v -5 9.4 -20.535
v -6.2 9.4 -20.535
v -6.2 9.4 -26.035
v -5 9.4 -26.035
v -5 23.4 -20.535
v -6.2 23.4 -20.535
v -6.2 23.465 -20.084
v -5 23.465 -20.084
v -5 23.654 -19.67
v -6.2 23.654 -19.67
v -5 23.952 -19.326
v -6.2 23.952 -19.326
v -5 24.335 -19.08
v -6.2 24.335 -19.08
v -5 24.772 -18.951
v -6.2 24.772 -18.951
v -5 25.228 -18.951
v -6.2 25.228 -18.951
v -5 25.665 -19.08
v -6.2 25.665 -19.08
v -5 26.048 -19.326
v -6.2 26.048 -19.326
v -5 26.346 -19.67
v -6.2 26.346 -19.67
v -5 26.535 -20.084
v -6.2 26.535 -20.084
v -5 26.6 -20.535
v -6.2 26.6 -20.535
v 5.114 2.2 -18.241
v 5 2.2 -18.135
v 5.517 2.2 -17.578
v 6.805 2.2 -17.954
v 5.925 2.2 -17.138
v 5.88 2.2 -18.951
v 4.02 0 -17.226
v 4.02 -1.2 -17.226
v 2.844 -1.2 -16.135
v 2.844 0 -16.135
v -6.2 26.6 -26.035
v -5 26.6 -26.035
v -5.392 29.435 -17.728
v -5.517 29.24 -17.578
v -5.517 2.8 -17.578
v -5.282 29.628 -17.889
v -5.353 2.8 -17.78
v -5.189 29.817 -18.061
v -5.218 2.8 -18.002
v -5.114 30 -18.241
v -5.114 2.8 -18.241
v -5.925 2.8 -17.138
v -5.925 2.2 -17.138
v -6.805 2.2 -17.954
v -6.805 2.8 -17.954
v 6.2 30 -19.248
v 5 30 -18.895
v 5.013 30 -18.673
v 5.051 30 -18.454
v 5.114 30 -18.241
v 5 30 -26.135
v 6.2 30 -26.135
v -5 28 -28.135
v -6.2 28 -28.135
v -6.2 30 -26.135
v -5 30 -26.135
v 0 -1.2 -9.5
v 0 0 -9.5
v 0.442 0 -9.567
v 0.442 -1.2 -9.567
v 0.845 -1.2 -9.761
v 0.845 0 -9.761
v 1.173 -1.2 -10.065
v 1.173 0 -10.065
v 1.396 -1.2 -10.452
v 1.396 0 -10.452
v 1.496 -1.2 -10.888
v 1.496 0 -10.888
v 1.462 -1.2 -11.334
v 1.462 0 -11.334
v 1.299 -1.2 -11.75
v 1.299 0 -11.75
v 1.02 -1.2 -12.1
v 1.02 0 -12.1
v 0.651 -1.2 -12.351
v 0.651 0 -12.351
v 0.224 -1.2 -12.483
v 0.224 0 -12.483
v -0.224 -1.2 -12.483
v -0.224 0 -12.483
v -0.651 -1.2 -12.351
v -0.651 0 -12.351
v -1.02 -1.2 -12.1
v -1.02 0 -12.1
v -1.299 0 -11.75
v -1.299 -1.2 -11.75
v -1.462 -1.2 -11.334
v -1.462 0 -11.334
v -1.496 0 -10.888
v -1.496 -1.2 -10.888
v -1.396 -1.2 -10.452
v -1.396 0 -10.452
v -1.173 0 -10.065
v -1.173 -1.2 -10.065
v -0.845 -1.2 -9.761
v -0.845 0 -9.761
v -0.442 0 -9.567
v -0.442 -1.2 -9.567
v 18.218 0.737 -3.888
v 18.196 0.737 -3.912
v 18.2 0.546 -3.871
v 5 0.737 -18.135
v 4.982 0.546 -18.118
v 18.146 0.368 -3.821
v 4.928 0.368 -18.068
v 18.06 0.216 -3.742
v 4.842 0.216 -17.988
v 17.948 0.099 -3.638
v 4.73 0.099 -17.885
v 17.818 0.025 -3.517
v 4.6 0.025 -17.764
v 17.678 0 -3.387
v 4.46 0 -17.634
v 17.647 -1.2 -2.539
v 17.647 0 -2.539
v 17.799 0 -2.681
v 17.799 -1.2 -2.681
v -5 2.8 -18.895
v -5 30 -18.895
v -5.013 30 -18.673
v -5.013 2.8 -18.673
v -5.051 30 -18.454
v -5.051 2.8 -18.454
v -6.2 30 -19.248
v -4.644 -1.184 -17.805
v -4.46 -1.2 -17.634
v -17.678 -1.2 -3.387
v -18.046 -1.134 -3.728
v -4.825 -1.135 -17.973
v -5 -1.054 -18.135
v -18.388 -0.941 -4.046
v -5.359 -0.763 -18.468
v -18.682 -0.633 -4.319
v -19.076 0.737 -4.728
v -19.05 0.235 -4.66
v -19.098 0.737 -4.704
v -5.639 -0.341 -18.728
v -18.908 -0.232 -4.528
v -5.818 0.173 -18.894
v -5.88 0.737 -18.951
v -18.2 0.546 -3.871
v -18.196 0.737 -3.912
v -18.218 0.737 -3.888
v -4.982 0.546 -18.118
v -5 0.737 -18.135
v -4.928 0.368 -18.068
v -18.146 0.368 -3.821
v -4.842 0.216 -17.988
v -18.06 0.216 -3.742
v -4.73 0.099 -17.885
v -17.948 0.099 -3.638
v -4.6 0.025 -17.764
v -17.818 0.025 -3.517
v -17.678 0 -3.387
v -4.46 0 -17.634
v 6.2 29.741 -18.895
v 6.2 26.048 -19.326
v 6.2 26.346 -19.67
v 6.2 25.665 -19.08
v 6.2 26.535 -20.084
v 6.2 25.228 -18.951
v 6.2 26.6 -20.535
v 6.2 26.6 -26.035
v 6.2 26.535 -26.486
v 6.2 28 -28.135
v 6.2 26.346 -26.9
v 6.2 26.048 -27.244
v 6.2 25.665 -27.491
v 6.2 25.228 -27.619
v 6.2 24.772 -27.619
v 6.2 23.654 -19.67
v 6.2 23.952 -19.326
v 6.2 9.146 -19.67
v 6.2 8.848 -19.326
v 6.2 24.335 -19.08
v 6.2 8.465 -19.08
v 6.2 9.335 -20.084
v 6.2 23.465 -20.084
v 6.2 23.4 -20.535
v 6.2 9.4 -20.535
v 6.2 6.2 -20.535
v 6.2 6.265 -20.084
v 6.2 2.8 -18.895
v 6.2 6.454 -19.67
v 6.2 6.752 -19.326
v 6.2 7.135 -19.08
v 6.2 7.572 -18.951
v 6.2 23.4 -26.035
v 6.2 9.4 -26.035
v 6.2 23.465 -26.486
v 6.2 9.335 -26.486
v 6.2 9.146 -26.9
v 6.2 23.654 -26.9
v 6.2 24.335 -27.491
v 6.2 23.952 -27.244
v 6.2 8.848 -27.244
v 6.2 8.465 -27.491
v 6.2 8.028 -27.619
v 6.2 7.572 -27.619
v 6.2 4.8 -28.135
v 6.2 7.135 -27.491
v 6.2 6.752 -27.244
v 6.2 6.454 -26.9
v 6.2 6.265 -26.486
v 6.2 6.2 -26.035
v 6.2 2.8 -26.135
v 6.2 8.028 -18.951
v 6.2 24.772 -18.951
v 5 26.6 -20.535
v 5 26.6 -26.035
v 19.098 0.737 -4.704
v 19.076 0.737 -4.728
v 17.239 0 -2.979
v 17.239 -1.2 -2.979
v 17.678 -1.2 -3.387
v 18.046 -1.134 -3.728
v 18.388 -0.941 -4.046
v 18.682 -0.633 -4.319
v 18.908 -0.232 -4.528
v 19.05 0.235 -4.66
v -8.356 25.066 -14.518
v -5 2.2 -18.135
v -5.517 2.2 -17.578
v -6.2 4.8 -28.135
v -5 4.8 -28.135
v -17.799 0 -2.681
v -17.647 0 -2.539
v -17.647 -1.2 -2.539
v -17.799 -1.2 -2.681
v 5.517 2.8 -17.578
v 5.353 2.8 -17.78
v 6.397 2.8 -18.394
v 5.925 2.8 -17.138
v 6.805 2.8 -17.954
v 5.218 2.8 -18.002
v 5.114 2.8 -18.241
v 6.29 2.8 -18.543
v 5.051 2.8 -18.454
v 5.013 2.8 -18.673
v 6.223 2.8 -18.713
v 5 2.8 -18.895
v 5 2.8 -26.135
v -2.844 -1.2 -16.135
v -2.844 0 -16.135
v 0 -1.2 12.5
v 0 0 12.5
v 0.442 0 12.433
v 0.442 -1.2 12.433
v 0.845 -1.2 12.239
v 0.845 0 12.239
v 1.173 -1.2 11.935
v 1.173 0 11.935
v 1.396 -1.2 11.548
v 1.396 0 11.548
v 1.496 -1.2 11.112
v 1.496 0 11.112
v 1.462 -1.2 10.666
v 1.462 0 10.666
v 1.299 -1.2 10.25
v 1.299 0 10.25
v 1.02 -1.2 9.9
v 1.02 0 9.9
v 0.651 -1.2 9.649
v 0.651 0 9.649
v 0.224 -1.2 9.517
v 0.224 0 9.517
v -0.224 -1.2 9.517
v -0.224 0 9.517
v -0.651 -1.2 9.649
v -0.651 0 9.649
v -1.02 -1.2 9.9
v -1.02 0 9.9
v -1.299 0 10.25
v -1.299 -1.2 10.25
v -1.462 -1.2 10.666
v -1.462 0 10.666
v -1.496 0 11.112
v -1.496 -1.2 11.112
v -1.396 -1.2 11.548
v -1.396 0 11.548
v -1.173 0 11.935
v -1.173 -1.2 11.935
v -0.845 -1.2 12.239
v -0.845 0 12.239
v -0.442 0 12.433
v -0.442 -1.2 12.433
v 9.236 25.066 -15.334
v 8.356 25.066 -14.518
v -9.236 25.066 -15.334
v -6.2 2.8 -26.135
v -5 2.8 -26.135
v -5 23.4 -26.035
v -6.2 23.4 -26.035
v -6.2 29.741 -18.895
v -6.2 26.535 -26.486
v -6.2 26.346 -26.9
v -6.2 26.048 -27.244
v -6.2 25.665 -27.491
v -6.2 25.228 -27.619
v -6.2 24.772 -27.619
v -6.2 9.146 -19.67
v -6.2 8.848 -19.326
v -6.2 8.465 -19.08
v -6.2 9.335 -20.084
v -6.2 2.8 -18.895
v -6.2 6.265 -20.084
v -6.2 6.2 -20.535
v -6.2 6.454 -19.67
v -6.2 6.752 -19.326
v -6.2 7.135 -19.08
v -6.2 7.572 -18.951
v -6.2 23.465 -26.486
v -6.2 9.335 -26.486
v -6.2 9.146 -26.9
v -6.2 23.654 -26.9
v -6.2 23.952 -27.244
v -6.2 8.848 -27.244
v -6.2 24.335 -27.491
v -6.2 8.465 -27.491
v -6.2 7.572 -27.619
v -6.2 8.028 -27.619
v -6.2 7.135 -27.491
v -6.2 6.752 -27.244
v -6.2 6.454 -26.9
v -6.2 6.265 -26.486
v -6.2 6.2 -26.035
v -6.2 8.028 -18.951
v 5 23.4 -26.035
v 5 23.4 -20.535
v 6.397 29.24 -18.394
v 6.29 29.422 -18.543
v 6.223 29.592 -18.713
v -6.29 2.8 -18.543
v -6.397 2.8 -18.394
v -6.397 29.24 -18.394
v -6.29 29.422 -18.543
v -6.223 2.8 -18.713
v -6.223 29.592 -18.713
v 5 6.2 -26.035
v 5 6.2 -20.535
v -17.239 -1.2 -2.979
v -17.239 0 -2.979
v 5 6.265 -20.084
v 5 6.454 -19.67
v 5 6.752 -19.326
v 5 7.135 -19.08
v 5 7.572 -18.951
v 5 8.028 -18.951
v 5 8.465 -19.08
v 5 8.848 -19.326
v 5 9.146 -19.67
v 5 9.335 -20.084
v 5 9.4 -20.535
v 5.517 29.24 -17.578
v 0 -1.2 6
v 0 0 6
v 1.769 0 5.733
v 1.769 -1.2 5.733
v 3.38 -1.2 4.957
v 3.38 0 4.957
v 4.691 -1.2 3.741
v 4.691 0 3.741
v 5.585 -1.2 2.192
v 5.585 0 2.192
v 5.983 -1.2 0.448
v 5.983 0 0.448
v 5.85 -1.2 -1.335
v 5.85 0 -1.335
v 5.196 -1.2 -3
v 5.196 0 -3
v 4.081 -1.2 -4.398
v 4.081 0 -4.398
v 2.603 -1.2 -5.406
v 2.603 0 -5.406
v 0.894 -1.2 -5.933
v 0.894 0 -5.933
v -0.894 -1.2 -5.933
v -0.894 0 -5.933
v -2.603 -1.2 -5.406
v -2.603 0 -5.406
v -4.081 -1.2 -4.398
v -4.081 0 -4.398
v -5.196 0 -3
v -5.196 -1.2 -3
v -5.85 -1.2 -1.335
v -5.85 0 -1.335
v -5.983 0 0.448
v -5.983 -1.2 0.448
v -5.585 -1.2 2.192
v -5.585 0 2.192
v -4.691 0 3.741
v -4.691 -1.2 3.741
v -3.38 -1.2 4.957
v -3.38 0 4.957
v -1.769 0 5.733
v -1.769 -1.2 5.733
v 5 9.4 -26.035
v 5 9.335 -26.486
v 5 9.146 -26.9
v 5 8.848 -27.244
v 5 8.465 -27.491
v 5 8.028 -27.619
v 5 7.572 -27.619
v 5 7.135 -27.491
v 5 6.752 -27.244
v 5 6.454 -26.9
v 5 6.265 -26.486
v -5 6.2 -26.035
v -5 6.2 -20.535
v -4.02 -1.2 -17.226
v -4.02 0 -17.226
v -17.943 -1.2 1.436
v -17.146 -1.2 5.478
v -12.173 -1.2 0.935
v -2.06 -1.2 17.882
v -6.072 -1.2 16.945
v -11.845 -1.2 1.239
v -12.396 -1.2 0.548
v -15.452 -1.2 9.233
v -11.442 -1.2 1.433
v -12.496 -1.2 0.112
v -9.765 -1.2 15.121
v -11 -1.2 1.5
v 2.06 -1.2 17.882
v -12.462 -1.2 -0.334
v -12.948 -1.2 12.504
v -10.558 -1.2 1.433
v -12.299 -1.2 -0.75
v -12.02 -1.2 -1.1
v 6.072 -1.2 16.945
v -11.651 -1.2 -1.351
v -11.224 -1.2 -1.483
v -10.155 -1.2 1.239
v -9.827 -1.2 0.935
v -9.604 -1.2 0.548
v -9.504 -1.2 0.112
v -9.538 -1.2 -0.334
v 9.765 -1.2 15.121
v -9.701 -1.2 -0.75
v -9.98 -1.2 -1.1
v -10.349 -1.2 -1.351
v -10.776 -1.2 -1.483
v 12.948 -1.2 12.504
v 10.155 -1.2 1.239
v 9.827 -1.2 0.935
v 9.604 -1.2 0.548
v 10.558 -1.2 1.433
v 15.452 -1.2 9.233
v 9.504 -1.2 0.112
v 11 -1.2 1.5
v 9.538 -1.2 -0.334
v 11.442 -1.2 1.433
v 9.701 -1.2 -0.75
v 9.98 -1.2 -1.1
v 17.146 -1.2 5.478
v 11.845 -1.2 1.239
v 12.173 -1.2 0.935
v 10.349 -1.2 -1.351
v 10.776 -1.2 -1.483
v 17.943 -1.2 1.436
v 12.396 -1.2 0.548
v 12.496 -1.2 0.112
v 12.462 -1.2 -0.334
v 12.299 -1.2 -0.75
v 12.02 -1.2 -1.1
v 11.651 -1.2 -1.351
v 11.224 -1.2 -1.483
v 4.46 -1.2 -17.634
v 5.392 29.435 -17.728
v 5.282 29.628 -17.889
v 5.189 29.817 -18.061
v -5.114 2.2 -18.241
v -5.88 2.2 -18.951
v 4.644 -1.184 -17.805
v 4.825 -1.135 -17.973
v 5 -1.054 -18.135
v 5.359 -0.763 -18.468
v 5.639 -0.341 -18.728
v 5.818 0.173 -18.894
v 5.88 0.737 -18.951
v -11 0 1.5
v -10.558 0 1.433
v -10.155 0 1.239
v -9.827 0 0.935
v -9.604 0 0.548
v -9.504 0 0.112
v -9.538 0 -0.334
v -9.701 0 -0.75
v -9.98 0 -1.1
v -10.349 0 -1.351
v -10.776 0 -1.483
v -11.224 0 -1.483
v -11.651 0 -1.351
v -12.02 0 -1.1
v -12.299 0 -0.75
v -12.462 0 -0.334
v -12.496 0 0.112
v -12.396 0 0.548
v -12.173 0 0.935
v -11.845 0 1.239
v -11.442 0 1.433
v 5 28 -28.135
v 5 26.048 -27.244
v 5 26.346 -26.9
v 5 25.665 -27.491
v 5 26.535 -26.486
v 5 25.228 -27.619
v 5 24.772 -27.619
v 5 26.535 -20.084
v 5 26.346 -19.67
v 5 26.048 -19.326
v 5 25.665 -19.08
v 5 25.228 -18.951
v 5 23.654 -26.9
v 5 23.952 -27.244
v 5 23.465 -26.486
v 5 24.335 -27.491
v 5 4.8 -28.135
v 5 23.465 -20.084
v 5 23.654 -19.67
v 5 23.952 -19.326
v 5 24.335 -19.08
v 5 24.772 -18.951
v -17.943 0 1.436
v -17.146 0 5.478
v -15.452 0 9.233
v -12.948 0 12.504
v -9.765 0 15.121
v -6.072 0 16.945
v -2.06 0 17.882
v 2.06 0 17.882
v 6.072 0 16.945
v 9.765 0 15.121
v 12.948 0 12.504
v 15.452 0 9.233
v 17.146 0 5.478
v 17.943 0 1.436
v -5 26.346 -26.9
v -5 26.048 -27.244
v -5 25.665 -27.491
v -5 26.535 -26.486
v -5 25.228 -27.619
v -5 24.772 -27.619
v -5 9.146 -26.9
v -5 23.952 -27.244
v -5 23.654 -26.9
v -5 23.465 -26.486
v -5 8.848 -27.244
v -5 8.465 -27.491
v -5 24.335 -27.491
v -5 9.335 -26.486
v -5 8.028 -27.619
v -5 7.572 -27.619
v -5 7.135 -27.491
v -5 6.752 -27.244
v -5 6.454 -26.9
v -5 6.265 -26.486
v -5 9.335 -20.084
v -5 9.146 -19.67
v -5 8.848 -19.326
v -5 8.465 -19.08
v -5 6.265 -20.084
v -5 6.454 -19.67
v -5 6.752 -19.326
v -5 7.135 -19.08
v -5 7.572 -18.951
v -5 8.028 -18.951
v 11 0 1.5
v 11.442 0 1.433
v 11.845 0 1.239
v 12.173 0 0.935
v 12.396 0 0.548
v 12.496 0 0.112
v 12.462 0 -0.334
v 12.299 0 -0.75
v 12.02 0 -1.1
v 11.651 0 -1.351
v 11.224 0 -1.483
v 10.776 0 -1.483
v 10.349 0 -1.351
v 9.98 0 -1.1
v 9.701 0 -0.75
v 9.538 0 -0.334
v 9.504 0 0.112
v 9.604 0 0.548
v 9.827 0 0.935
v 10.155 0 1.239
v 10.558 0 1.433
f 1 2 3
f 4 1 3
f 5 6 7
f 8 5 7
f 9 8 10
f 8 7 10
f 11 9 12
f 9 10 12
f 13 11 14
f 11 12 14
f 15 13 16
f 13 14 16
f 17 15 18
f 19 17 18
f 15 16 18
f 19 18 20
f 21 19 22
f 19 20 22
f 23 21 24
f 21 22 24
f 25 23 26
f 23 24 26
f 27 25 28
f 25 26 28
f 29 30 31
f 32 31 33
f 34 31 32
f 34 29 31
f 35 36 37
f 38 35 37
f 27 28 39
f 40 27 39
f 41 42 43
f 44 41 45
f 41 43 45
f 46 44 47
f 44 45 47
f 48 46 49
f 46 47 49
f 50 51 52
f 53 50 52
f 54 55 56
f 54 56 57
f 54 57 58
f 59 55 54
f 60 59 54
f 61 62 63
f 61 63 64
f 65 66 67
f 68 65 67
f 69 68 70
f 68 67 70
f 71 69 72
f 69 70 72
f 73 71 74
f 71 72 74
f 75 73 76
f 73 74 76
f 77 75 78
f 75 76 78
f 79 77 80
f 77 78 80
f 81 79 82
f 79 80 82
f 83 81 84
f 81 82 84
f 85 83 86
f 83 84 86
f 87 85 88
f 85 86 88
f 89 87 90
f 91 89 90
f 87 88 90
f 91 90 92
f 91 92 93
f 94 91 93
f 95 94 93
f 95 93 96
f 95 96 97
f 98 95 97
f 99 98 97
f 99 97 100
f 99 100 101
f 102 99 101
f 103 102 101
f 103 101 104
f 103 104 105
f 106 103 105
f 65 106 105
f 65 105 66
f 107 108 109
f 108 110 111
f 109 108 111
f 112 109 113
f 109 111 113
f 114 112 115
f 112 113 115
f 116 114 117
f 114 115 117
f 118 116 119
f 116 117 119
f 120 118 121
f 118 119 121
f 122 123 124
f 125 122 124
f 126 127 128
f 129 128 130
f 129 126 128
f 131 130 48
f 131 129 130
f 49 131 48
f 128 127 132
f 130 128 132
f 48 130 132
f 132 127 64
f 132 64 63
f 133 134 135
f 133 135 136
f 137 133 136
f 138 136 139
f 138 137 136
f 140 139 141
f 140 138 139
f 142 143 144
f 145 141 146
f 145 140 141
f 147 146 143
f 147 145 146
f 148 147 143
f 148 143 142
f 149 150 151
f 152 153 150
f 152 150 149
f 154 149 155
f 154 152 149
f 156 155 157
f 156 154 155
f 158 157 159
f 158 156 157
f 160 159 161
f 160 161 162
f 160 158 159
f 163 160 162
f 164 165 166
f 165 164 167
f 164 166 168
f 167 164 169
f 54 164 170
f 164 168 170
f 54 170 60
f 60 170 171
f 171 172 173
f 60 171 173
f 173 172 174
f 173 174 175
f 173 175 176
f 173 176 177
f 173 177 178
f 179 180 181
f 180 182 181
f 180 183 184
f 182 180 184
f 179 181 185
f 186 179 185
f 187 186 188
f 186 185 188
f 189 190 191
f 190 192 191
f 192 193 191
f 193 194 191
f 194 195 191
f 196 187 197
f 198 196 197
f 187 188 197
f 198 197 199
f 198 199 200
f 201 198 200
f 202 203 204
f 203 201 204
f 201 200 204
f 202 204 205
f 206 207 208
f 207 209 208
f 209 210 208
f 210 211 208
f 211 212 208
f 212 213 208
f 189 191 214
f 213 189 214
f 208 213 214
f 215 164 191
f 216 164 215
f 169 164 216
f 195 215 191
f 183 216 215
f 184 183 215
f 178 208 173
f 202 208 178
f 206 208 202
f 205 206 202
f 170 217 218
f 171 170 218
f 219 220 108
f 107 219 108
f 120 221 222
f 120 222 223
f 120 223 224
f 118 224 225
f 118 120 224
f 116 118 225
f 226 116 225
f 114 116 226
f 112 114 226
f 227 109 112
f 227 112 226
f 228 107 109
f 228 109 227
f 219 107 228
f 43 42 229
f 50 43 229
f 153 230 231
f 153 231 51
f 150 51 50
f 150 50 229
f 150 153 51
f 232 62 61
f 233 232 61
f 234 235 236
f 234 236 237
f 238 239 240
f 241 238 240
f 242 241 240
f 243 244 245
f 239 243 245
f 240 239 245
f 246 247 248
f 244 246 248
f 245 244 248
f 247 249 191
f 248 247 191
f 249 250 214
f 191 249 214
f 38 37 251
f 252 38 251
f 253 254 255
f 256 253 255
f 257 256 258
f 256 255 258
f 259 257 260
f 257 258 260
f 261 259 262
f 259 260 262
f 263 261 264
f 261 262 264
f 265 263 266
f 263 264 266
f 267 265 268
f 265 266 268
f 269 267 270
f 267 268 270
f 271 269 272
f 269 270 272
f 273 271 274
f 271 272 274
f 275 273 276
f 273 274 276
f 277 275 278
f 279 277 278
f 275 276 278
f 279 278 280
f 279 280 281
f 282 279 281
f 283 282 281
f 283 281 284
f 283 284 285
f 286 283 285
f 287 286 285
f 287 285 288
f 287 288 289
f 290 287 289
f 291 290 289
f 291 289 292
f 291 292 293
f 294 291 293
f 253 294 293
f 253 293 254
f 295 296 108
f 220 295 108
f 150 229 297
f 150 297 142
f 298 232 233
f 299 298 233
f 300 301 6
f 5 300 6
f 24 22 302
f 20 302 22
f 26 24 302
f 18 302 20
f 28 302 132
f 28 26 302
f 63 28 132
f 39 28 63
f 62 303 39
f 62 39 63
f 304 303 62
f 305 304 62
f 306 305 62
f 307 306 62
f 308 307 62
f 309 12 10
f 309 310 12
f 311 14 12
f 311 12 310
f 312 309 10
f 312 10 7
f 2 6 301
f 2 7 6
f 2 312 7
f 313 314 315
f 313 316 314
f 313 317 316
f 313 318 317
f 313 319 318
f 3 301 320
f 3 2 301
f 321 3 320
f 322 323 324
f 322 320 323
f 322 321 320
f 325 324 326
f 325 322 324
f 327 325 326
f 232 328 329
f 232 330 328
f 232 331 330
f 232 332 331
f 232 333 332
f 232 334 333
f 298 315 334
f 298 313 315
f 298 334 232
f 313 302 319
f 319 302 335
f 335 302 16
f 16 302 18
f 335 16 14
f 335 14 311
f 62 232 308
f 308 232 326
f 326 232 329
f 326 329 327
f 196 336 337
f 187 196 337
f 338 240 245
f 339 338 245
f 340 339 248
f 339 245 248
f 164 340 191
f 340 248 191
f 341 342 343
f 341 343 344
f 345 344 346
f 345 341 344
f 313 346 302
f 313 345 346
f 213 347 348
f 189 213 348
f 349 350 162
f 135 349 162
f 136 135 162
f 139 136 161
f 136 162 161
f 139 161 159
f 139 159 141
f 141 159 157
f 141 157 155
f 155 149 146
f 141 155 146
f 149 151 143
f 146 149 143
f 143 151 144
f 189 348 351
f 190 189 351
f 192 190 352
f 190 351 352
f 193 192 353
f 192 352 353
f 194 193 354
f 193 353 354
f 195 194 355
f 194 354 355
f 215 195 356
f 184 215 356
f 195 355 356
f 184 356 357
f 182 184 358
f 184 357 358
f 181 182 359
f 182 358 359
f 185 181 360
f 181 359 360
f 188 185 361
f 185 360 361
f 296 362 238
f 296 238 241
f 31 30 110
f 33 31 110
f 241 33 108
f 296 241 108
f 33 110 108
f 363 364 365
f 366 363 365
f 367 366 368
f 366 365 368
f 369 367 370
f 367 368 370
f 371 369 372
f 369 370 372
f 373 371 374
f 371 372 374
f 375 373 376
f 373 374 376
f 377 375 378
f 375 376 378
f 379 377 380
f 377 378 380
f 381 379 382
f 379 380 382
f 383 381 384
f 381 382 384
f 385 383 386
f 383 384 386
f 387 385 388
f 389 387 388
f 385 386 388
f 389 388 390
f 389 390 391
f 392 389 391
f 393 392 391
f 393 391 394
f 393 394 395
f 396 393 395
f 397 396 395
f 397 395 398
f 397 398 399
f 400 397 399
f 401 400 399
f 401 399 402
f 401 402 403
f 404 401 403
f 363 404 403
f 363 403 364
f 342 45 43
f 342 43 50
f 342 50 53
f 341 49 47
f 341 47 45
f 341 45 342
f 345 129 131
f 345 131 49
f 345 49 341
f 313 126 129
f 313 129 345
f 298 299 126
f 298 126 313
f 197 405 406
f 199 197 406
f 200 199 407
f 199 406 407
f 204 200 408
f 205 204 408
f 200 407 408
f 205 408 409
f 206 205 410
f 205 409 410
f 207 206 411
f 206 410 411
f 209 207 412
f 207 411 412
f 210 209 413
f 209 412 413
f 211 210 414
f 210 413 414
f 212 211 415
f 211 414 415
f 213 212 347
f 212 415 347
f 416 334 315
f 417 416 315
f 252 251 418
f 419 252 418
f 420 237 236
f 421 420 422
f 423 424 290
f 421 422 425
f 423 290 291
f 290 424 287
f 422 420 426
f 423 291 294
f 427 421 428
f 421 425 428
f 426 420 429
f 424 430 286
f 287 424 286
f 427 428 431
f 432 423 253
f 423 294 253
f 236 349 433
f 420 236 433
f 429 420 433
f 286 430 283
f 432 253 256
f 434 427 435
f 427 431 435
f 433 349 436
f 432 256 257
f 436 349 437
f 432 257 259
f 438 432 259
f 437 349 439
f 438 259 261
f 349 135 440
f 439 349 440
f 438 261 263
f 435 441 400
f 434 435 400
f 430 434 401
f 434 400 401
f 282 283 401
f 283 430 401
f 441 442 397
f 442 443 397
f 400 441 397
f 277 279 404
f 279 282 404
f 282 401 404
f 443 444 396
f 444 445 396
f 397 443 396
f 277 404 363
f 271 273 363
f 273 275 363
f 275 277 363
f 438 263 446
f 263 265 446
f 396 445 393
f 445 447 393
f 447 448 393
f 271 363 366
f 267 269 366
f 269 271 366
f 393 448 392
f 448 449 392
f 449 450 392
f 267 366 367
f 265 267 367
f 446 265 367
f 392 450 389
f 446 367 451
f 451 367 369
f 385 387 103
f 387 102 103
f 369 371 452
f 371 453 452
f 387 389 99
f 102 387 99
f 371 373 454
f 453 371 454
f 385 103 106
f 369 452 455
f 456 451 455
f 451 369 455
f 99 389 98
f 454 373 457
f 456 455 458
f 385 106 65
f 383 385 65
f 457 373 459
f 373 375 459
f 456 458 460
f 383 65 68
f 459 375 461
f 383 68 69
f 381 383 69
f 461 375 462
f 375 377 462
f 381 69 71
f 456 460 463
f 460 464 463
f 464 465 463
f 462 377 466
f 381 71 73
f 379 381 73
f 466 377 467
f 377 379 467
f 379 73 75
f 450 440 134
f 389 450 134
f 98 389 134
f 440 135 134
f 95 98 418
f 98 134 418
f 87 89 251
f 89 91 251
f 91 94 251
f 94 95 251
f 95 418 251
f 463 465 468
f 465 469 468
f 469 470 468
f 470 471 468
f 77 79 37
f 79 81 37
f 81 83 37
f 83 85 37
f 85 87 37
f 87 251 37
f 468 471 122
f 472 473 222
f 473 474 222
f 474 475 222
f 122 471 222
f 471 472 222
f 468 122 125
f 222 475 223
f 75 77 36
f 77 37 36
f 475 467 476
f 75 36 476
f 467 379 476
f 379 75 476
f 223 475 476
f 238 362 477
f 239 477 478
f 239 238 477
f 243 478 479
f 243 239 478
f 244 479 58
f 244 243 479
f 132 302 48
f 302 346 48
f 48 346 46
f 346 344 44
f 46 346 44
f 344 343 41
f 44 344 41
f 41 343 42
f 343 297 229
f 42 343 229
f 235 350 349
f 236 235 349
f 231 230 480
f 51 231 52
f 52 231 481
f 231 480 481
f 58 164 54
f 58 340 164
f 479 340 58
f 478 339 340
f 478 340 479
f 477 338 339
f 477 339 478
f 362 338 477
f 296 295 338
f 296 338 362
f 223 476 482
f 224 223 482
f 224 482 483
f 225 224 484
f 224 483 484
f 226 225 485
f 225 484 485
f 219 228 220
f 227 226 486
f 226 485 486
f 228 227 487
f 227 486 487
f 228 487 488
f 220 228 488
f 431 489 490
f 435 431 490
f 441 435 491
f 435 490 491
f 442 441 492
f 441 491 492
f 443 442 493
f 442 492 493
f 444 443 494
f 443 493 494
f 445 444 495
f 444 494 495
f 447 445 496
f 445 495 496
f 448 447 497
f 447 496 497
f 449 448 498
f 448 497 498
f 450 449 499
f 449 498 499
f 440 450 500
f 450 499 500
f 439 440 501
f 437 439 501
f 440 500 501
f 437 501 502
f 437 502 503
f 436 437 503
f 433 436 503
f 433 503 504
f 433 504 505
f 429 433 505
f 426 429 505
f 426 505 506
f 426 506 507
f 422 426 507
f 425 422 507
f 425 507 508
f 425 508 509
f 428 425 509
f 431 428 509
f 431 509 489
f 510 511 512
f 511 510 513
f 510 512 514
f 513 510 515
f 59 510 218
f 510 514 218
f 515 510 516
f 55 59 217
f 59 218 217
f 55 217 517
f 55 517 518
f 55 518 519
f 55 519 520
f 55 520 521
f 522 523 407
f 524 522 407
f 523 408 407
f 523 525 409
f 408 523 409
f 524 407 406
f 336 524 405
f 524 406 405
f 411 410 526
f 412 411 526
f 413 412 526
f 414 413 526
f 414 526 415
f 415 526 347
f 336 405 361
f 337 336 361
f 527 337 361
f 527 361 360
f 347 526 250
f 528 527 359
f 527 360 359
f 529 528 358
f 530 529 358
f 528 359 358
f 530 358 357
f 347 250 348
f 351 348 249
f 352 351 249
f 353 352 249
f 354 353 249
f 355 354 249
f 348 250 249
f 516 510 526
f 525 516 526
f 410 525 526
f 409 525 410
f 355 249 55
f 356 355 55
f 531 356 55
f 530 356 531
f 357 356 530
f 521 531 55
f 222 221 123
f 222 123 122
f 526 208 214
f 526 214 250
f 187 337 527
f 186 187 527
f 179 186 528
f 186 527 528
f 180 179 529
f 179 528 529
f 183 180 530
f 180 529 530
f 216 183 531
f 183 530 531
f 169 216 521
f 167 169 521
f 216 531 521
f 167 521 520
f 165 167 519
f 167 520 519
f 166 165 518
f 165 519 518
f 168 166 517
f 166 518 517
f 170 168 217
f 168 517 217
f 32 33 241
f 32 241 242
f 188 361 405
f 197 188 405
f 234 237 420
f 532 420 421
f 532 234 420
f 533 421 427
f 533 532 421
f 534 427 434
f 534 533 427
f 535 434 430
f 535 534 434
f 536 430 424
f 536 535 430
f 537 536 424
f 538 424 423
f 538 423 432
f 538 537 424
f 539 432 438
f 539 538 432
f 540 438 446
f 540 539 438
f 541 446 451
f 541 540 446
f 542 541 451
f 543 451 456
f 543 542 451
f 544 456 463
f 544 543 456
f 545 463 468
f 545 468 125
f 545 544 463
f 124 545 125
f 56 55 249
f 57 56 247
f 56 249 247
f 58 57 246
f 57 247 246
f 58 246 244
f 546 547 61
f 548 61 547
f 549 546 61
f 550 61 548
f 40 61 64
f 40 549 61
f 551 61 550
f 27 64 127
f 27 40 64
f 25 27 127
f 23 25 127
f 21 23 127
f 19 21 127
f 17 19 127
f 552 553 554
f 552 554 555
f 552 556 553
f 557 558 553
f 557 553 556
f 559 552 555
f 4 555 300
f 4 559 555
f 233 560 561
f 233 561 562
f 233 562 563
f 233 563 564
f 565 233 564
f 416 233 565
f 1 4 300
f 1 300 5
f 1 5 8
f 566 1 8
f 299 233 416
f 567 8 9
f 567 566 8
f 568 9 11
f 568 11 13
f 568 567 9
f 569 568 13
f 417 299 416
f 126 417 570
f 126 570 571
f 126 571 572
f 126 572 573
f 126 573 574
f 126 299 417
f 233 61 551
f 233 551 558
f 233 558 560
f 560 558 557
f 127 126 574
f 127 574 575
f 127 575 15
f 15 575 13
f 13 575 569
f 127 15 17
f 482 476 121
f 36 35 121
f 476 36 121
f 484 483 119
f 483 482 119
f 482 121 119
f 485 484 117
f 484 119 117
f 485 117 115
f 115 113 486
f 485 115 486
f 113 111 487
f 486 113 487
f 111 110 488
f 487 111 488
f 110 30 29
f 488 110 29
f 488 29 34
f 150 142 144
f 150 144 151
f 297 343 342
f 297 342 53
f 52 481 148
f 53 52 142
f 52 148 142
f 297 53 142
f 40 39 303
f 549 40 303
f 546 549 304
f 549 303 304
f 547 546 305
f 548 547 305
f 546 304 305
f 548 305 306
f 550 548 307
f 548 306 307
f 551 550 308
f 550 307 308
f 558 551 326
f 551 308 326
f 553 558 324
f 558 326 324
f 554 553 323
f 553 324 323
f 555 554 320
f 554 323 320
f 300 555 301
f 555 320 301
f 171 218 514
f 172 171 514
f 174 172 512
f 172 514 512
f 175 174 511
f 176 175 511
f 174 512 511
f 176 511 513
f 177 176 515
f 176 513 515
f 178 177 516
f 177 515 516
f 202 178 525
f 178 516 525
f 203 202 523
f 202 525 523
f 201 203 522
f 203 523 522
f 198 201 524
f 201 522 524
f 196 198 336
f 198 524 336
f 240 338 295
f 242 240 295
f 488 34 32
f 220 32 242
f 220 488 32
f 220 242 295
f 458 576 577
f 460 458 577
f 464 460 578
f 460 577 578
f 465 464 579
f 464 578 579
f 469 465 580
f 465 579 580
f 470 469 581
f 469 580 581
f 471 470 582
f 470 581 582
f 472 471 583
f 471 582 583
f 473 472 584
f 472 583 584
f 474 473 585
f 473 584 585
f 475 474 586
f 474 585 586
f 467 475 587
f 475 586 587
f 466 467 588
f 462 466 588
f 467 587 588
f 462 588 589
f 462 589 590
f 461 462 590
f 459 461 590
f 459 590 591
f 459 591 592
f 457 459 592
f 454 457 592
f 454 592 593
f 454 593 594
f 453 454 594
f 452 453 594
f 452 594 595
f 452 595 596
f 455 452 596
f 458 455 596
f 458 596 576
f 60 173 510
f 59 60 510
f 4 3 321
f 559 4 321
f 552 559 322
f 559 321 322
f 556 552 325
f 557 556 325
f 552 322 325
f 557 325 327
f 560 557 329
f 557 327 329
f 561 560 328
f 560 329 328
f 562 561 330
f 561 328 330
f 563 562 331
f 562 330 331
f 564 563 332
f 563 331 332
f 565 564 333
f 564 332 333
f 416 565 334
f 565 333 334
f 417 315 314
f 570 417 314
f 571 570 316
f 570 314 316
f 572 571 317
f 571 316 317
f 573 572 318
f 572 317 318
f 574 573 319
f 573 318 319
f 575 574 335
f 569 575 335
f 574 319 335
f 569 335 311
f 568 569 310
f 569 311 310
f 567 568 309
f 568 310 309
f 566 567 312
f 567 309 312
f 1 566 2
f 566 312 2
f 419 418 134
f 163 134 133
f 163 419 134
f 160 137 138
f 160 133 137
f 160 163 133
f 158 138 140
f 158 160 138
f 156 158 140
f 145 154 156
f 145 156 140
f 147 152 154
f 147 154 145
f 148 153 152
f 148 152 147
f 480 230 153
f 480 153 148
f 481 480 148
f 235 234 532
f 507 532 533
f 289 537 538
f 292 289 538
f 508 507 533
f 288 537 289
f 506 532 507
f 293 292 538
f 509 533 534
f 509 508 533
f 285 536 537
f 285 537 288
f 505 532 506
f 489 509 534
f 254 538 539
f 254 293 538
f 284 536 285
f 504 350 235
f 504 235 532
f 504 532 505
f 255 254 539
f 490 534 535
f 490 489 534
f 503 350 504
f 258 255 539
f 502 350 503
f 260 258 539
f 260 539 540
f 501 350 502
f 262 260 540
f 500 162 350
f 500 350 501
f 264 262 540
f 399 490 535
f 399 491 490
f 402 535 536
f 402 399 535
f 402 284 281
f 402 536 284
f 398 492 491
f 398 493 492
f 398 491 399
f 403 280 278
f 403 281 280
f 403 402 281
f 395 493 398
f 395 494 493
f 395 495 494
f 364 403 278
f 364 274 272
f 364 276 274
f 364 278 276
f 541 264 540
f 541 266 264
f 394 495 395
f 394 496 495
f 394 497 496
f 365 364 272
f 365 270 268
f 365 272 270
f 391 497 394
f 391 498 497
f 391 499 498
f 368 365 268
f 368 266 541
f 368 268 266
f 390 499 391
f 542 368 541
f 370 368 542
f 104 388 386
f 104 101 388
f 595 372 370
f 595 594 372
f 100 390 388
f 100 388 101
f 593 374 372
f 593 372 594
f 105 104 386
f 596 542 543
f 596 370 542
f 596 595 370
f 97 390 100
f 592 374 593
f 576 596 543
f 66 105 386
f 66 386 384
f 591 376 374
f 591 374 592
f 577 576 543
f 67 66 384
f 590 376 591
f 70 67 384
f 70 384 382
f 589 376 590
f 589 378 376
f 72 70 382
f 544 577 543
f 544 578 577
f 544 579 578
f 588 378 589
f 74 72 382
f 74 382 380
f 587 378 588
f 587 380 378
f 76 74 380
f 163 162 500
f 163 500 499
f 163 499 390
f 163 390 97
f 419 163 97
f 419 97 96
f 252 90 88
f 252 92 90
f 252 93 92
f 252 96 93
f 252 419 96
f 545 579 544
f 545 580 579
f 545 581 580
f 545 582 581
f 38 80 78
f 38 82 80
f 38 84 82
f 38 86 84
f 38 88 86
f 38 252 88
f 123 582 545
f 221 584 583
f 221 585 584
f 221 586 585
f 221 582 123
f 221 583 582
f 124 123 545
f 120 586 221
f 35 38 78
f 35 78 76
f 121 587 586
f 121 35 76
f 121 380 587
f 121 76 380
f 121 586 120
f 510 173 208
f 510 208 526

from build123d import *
from OCP.BRepFilletAPI import BRepFilletAPI_MakeChamfer

# Parameters (mm, degrees)
T_LE_DE_BASE_PLI_E1_DEPTH       = 1.2
ESQUISSE12_R                    = 1.5
ESQUISSE12_R_2                  = 6
ENL_V_MAT_EXTRU_1_DEPTH         = 26.579729358
T_LE_START                      = -10.493561241
T_LE_PLI_E_SUR_AR_TE1_OUTLINE_W = 1.3366
T_LE_PLI_E_SUR_AR_TE1_OUTLINE_H = 1.2
T_LE_PLI_E_SUR_AR_TE1_DEPTH     = 0.6
T_LE_START_2                    = 9.540892015
T_LE_PLI_E_SUR_AR_TE1_2_DEPTH   = 0.6
T_LE_START_3                    = -9.893561241
T_LE_PLI_E_SUR_AR_TE1_3_DEPTH   = 19.434453256
T_LE_PLI_E_SUR_AR_TE1_4_DEPTH   = 2
T_LE_PLI_E_SUR_AR_TE1_5_DEPTH   = 19.434453256
T_LE_START_4                    = 16
T_LE_PLI_E_SUR_AR_TE1_6_DEPTH   = 1.2
T_LE_START_5                    = 2.2
T_LE_PLI_E_SUR_AR_TE2_DEPTH     = 27.8
T_LE_PLI_E_SUR_AR_TE2_2_DEPTH   = 0.6
T_LE_START_6                    = 2.8
T_LE_PLI_E_SUR_AR_TE2_3_DEPTH   = 27.2
CHANFREIN1_SIZE                 = 2
CHANFREIN1_SIZE2                = 5.740607303
CHANFREIN1_OF_SYM_TRIE1_SIZE    = 2
CHANFREIN1_OF_SYM_TRIE1_SIZE2   = 5.740607303
ENL_V_MAT_EXTRU_2_DEPTH         = 46.34668098
ENL_V_MAT_EXTRU_2_DEPTH_BACK    = 46.34668098
ENL_V_MAT_EXTRU_7_DEPTH         = 2


with BuildPart() as part:
    # Tôle de base pliée1: sheet metal written as solids
    # Esquisse1 → Tôle de base pliée1 (new body)
    with BuildSketch(Plane(origin=(0, 0, 0), x_dir=(1, 0, 0), z_dir=(0, 1, 0))):
        with BuildLine():
            Line((-5, 18.135119355), (-17.337811592, 4.837384541))
            ThreePointArc((-17.337811592, 4.837384541), (0, -18), (17.337811592, 4.837384541))
            Line((17.337811592, 4.837384541), (5, 18.135119355))
            Line((5, 18.135119355), (-5, 18.135119355))
        make_face()
    extrude(amount=-T_LE_DE_BASE_PLI_E1_DEPTH)

    # Esquisse12 → Enlèv. mat.-Extru.1 (cut, through all)
    with BuildSketch(Plane(origin=(0, 0, 0), x_dir=(1, 0, 0), z_dir=(0, 1, 0))):
        with Locations(Location((11, 0, 0), (0, 0, 270))):
            Circle(ESQUISSE12_R)
        with Locations(Location((0, 11, 0), (0, 0, 270))):
            Circle(ESQUISSE12_R)
        with Locations(Location((-11, 0, 0), (0, 0, 270))):
            Circle(ESQUISSE12_R)
        with Locations(Location((0, -11, 0), (0, 0, 270))):
            Circle(ESQUISSE12_R)
        with Locations(Location((0, 0, 0), (0, 0, 270))):
            Circle(ESQUISSE12_R_2)
    extrude(amount=-ENL_V_MAT_EXTRU_1_DEPTH, mode=Mode.SUBTRACT)

    # Tôle pliée sur arête1: read off the stored shape, not the designer's step
    # Tôle pliée sur arête1 outline → Tôle pliée sur arête1 (cut)
    with BuildSketch(Plane(origin=(0, 0, 0), x_dir=(0.7330706501266544, 0, -0.6801524990198037), z_dir=(0.6801524990198037, 0, 0.7330706501266546)).offset(T_LE_START)):
        with Locations((15.3317, -0.6)):
            Rectangle(T_LE_PLI_E_SUR_AR_TE1_OUTLINE_W, T_LE_PLI_E_SUR_AR_TE1_OUTLINE_H)
    t_le_pli_e_sur_ar_te1 = extrude(amount=T_LE_PLI_E_SUR_AR_TE1_DEPTH, mode=Mode.SUBTRACT)

    # T_le pli_e sur ar_te1 2 outline → T_le pli_e sur ar_te1 2 (cut)
    with BuildSketch(Plane(origin=(0, 0, 0), x_dir=(0.7330706501266544, 0, -0.6801524990198037), z_dir=(0.6801524990198037, 0, 0.7330706501266546)).offset(T_LE_START_2)):
        with BuildLine():
            Line((14.6634, 0), (14.6634, -1.2))
            Line((14.6634, -1.2), (15.2634, -1.2))
            ThreePointArc((15.2634, -1.2), (15.638821762, -1.163262642), (16, -1.054444388))
            Line((16, -1.054444388), (16, 0))
            Line((16, 0), (14.6634, 0))
        make_face()
    t_le_pli_e_sur_ar_te1_2 = extrude(amount=T_LE_PLI_E_SUR_AR_TE1_2_DEPTH, mode=Mode.SUBTRACT)

    # T_le pli_e sur ar_te1 3 outline → T_le pli_e sur ar_te1 3 (cut)
    with BuildSketch(Plane(origin=(0, 0, 0), x_dir=(0.7330706501266544, 0, -0.6801524990198037), z_dir=(0.6801524990198037, 0, 0.7330706501266546)).offset(T_LE_START_3)):
        with BuildLine():
            ThreePointArc((16, -1.054444388), (15.638821762, -1.163262642), (15.2634, -1.2))
            Line((15.2634, -1.2), (16, -1.2))
            Line((16, -1.2), (16, -1.054444388))
        make_face()
    t_le_pli_e_sur_ar_te1_3 = extrude(amount=T_LE_PLI_E_SUR_AR_TE1_3_DEPTH, mode=Mode.SUBTRACT)

    # T_le pli_e sur ar_te1 4 outline → T_le pli_e sur ar_te1 4 (add)
    with BuildSketch(Plane(origin=(0, 0, 0), x_dir=(0.7330706501266544, 0, -0.6801524990198037), z_dir=(0.6801524990198037, 0, 0.7330706501266546)).offset(T_LE_START_3)):
        with BuildLine():
            ThreePointArc((16, 0.7366), (15.784254855, 0.215745145), (15.2634, 0))
            Line((15.2634, 0), (16, 0))
            Line((16, 0), (16, -1.054444388))
            ThreePointArc((16, -1.054444388), (16.872269031, -0.341342484), (17.2, 0.7366))
            Line((17.2, 0.7366), (17.2, 30))
            Line((17.2, 30), (16, 30))
            Line((16, 30), (16, 0.7366))
        make_face()
    t_le_pli_e_sur_ar_te1_4 = extrude(amount=T_LE_PLI_E_SUR_AR_TE1_4_DEPTH)

    # T_le pli_e sur ar_te1 5 outline → T_le pli_e sur ar_te1 5 (add)
    with BuildSketch(Plane(origin=(0, 0, 0), x_dir=(0.7330706501266544, 0, -0.6801524990198037), z_dir=(0.6801524990198037, 0, 0.7330706501266546)).offset(T_LE_START_3)):
        with BuildLine():
            Line((14.6634, 0), (14.6634, -1.2))
            Line((14.6634, -1.2), (15.2634, -1.2))
            ThreePointArc((15.2634, -1.2), (16.632782992, -0.632782992), (17.2, 0.7366))
            Line((17.2, 0.7366), (16, 0.7366))
            ThreePointArc((16, 0.7366), (15.784254855, 0.215745145), (15.2634, 0))
            Line((15.2634, 0), (14.6634, 0))
        make_face()
    t_le_pli_e_sur_ar_te1_5 = extrude(amount=T_LE_PLI_E_SUR_AR_TE1_5_DEPTH)

    # T_le pli_e sur ar_te1 6 outline → T_le pli_e sur ar_te1 6 (add)
    with BuildSketch(Plane(origin=(0, 0, 0), x_dir=(0.6801524990198036, 0, 0.7330706501266546), z_dir=(0.7330706501266546, 0, -0.6801524990198037)).offset(T_LE_START_4)):
        Polygon((-7.893561241, -30), (9.508185371, -0.7366), (-7.893561241, -0.7366), align=None)
    t_le_pli_e_sur_ar_te1_6 = extrude(amount=T_LE_PLI_E_SUR_AR_TE1_6_DEPTH)

    # Tôle pliée sur arête2: read off the stored shape, not the designer's step
    # Tôle pliée sur arête2 outline → Tôle pliée sur arête2 (cut)
    with BuildSketch(Plane(origin=(0, 0, 0), x_dir=(1, 0, 0), z_dir=(0, 1, 0)).offset(T_LE_START_5)):
        with BuildLine():
            Line((5, 18.135119355), (5.516935379, 17.577964666))
            ThreePointArc((5.516935379, 17.577964666), (5.281888127, 17.88899285), (5.113898069, 18.240795467))
            Line((5.113898069, 18.240795467), (5, 18.135119355))
        make_face()
    t_le_pli_e_sur_ar_te2 = extrude(amount=T_LE_PLI_E_SUR_AR_TE2_DEPTH, mode=Mode.SUBTRACT)

    # T_le pli_e sur ar_te2 2 outline → T_le pli_e sur ar_te2 2 (cut)
    with BuildSketch(Plane(origin=(0, 0, 0), x_dir=(1, 0, 0), z_dir=(0, 1, 0)).offset(T_LE_START_5)):
        with BuildLine():
            Line((5.925026878, 17.138122276), (6.804711659, 17.954305274))
            Line((6.804711659, 17.954305274), (5.87968478, 18.951302354))
            Line((5.87968478, 18.951302354), (5.113898069, 18.240795467))
            ThreePointArc((5.113898069, 18.240795467), (5.281888127, 17.88899285), (5.516935379, 17.577964666))
            Line((5.516935379, 17.577964666), (5.925026878, 17.138122276))
        make_face()
    t_le_pli_e_sur_ar_te2_2 = extrude(amount=T_LE_PLI_E_SUR_AR_TE2_2_DEPTH, mode=Mode.SUBTRACT)

    # T_le pli_e sur ar_te2 3 outline → T_le pli_e sur ar_te2 3 (add)
    with BuildSketch(Plane(origin=(0, 0, 0), x_dir=(1, 0, 0), z_dir=(0, 1, 0)).offset(T_LE_START_6)):
        with BuildLine():
            Line((5.87968478, 18.951302354), (6.396620159, 18.394147664))
            ThreePointArc((6.396620159, 18.394147664), (6.250914682, 18.626047262), (6.2, 18.895147995))
            Line((6.2, 18.895147995), (6.2, 28.135119355))
            Line((6.2, 28.135119355), (5, 28.135119355))
            Line((5, 28.135119355), (5, 18.895147995))
            ThreePointArc((5, 18.895147995), (5.028686989, 18.563052376), (5.113898069, 18.240795467))
            Line((5.113898069, 18.240795467), (5.87968478, 18.951302354))
        make_face()
    t_le_pli_e_sur_ar_te2_3 = extrude(amount=T_LE_PLI_E_SUR_AR_TE2_3_DEPTH)

    # Chanfrein1: one chamfer whose edges measure the first distance from different faces: ONE call of the kernel's chamfer builder (chamfer() names one face for all edges)
    chanfrein1_edges_1 = [part.edges().sort_by_distance(p)[0] for p in [
        (5.6, 2.8, -28.135119355),
        (5.6, 30, -28.135119355),
    ]]
    chanfrein1_edges_2 = [part.edges().sort_by_distance(p)[0] for p in [
        (6.800147388, 30, -17.077069554),
    ]]
    chanfrein1_side_2 = [part.faces().sort_by_distance(p)[0] for p in [
        (5.687529449, 30, -22.422147631),
    ]]
    chanfrein1 = BRepFilletAPI_MakeChamfer(part.part.solid().wrapped)
    for e in chanfrein1_edges_1:
        chanfrein1.Add(CHANFREIN1_SIZE, e.wrapped)
    for e in chanfrein1_edges_2:
        chanfrein1.Add(CHANFREIN1_SIZE, CHANFREIN1_SIZE2, e.wrapped, chanfrein1_side_2[0].wrapped)  # the first distance lies on this face
    add(Compound.cast(chanfrein1.Shape()), mode=Mode.REPLACE)

    # Symétrie1: Tôle pliée sur arête1, T_le pli_e sur ar_te1 2, T_le pli_e sur ar_te1 3, T_le pli_e sur ar_te1 4, T_le pli_e sur ar_te1 5, T_le pli_e sur ar_te1 6, Tôle pliée sur arête2, T_le pli_e sur ar_te2 2, T_le pli_e sur ar_te2 3 across plane
    add(t_le_pli_e_sur_ar_te1.mirror(Plane(origin=(0, 0, 0), x_dir=(0, 0, 1), z_dir=(1, 0, 0))), mode=Mode.SUBTRACT)
    add(t_le_pli_e_sur_ar_te1_2.mirror(Plane(origin=(0, 0, 0), x_dir=(0, 0, 1), z_dir=(1, 0, 0))), mode=Mode.SUBTRACT)
    add(t_le_pli_e_sur_ar_te1_3.mirror(Plane(origin=(0, 0, 0), x_dir=(0, 0, 1), z_dir=(1, 0, 0))), mode=Mode.SUBTRACT)
    add(t_le_pli_e_sur_ar_te1_4.mirror(Plane(origin=(0, 0, 0), x_dir=(0, 0, 1), z_dir=(1, 0, 0))))
    add(t_le_pli_e_sur_ar_te1_5.mirror(Plane(origin=(0, 0, 0), x_dir=(0, 0, 1), z_dir=(1, 0, 0))))
    add(t_le_pli_e_sur_ar_te1_6.mirror(Plane(origin=(0, 0, 0), x_dir=(0, 0, 1), z_dir=(1, 0, 0))))
    add(t_le_pli_e_sur_ar_te2.mirror(Plane(origin=(0, 0, 0), x_dir=(0, 0, 1), z_dir=(1, 0, 0))), mode=Mode.SUBTRACT)
    add(t_le_pli_e_sur_ar_te2_2.mirror(Plane(origin=(0, 0, 0), x_dir=(0, 0, 1), z_dir=(1, 0, 0))), mode=Mode.SUBTRACT)
    add(t_le_pli_e_sur_ar_te2_3.mirror(Plane(origin=(0, 0, 0), x_dir=(0, 0, 1), z_dir=(1, 0, 0))))

    # Chanfrein1 of Symétrie1: one chamfer whose edges measure the first distance from different faces: ONE call of the kernel's chamfer builder (chamfer() names one face for all edges)
    chanfrein1_of_sym_trie1_edges_1 = [part.edges().sort_by_distance(p)[0] for p in [
        (-5.6, 2.8, -28.135119355),
        (-5.6, 30, -28.135119355),
    ]]
    chanfrein1_of_sym_trie1_edges_2 = [part.edges().sort_by_distance(p)[0] for p in [
        (-6.800147388, 30, -17.077069554),
    ]]
    chanfrein1_of_sym_trie1_side_2 = [part.faces().sort_by_distance(p)[0] for p in [
        (-5.687529449, 30, -22.422147631),
    ]]
    chanfrein1_of_sym_trie1 = BRepFilletAPI_MakeChamfer(part.part.solid().wrapped)
    for e in chanfrein1_of_sym_trie1_edges_1:
        chanfrein1_of_sym_trie1.Add(CHANFREIN1_OF_SYM_TRIE1_SIZE, e.wrapped)
    for e in chanfrein1_of_sym_trie1_edges_2:
        chanfrein1_of_sym_trie1.Add(CHANFREIN1_OF_SYM_TRIE1_SIZE, CHANFREIN1_OF_SYM_TRIE1_SIZE2, e.wrapped, chanfrein1_of_sym_trie1_side_2[0].wrapped)  # the first distance lies on this face
    add(Compound.cast(chanfrein1_of_sym_trie1.Shape()), mode=Mode.REPLACE)

    # Esquisse13 → Enlèv. mat.-Extru.2 (cut, two sides: drawn at the far end of the back side and taken through both)
    with BuildSketch(Plane(origin=(0, 0, 0), x_dir=(0, 0, -1), z_dir=(1, 0, 0)).offset(-ENL_V_MAT_EXTRU_2_DEPTH_BACK)):
        with BuildLine():
            Line((26.035119355, 23.4), (20.535119355, 23.4))
            ThreePointArc((20.535119355, 23.4), (18.935119355, 25), (20.535119355, 26.6))
            Line((20.535119355, 26.6), (26.035119355, 26.6))
            ThreePointArc((26.035119355, 26.6), (27.635119355, 25), (26.035119355, 23.4))
        make_face()
        with BuildLine():
            Line((26.035119355, 6.2), (20.535119355, 6.2))
            ThreePointArc((20.535119355, 6.2), (18.935119355, 7.8), (20.535119355, 9.4))
            Line((20.535119355, 9.4), (26.035119355, 9.4))
            ThreePointArc((26.035119355, 9.4), (27.635119355, 7.8), (26.035119355, 6.2))
        make_face()
    extrude(amount=ENL_V_MAT_EXTRU_2_DEPTH + ENL_V_MAT_EXTRU_2_DEPTH_BACK, mode=Mode.SUBTRACT)

    # Esquisse15 → Enlèv. mat.-Extru.7 (cut)
    with BuildSketch(Plane.XZ.offset(1.2)):
        Polygon((4.117844894, -17.316780768), (2.84424625, -16.135119355), (-2.84424625, -16.135119355), (-4.117844894, -17.316780768), (-4.117844894, -18.135119355), (4.117844894, -18.135119355), align=None)
    extrude(amount=-ENL_V_MAT_EXTRU_7_DEPTH, mode=Mode.SUBTRACT)


solid = part.part
